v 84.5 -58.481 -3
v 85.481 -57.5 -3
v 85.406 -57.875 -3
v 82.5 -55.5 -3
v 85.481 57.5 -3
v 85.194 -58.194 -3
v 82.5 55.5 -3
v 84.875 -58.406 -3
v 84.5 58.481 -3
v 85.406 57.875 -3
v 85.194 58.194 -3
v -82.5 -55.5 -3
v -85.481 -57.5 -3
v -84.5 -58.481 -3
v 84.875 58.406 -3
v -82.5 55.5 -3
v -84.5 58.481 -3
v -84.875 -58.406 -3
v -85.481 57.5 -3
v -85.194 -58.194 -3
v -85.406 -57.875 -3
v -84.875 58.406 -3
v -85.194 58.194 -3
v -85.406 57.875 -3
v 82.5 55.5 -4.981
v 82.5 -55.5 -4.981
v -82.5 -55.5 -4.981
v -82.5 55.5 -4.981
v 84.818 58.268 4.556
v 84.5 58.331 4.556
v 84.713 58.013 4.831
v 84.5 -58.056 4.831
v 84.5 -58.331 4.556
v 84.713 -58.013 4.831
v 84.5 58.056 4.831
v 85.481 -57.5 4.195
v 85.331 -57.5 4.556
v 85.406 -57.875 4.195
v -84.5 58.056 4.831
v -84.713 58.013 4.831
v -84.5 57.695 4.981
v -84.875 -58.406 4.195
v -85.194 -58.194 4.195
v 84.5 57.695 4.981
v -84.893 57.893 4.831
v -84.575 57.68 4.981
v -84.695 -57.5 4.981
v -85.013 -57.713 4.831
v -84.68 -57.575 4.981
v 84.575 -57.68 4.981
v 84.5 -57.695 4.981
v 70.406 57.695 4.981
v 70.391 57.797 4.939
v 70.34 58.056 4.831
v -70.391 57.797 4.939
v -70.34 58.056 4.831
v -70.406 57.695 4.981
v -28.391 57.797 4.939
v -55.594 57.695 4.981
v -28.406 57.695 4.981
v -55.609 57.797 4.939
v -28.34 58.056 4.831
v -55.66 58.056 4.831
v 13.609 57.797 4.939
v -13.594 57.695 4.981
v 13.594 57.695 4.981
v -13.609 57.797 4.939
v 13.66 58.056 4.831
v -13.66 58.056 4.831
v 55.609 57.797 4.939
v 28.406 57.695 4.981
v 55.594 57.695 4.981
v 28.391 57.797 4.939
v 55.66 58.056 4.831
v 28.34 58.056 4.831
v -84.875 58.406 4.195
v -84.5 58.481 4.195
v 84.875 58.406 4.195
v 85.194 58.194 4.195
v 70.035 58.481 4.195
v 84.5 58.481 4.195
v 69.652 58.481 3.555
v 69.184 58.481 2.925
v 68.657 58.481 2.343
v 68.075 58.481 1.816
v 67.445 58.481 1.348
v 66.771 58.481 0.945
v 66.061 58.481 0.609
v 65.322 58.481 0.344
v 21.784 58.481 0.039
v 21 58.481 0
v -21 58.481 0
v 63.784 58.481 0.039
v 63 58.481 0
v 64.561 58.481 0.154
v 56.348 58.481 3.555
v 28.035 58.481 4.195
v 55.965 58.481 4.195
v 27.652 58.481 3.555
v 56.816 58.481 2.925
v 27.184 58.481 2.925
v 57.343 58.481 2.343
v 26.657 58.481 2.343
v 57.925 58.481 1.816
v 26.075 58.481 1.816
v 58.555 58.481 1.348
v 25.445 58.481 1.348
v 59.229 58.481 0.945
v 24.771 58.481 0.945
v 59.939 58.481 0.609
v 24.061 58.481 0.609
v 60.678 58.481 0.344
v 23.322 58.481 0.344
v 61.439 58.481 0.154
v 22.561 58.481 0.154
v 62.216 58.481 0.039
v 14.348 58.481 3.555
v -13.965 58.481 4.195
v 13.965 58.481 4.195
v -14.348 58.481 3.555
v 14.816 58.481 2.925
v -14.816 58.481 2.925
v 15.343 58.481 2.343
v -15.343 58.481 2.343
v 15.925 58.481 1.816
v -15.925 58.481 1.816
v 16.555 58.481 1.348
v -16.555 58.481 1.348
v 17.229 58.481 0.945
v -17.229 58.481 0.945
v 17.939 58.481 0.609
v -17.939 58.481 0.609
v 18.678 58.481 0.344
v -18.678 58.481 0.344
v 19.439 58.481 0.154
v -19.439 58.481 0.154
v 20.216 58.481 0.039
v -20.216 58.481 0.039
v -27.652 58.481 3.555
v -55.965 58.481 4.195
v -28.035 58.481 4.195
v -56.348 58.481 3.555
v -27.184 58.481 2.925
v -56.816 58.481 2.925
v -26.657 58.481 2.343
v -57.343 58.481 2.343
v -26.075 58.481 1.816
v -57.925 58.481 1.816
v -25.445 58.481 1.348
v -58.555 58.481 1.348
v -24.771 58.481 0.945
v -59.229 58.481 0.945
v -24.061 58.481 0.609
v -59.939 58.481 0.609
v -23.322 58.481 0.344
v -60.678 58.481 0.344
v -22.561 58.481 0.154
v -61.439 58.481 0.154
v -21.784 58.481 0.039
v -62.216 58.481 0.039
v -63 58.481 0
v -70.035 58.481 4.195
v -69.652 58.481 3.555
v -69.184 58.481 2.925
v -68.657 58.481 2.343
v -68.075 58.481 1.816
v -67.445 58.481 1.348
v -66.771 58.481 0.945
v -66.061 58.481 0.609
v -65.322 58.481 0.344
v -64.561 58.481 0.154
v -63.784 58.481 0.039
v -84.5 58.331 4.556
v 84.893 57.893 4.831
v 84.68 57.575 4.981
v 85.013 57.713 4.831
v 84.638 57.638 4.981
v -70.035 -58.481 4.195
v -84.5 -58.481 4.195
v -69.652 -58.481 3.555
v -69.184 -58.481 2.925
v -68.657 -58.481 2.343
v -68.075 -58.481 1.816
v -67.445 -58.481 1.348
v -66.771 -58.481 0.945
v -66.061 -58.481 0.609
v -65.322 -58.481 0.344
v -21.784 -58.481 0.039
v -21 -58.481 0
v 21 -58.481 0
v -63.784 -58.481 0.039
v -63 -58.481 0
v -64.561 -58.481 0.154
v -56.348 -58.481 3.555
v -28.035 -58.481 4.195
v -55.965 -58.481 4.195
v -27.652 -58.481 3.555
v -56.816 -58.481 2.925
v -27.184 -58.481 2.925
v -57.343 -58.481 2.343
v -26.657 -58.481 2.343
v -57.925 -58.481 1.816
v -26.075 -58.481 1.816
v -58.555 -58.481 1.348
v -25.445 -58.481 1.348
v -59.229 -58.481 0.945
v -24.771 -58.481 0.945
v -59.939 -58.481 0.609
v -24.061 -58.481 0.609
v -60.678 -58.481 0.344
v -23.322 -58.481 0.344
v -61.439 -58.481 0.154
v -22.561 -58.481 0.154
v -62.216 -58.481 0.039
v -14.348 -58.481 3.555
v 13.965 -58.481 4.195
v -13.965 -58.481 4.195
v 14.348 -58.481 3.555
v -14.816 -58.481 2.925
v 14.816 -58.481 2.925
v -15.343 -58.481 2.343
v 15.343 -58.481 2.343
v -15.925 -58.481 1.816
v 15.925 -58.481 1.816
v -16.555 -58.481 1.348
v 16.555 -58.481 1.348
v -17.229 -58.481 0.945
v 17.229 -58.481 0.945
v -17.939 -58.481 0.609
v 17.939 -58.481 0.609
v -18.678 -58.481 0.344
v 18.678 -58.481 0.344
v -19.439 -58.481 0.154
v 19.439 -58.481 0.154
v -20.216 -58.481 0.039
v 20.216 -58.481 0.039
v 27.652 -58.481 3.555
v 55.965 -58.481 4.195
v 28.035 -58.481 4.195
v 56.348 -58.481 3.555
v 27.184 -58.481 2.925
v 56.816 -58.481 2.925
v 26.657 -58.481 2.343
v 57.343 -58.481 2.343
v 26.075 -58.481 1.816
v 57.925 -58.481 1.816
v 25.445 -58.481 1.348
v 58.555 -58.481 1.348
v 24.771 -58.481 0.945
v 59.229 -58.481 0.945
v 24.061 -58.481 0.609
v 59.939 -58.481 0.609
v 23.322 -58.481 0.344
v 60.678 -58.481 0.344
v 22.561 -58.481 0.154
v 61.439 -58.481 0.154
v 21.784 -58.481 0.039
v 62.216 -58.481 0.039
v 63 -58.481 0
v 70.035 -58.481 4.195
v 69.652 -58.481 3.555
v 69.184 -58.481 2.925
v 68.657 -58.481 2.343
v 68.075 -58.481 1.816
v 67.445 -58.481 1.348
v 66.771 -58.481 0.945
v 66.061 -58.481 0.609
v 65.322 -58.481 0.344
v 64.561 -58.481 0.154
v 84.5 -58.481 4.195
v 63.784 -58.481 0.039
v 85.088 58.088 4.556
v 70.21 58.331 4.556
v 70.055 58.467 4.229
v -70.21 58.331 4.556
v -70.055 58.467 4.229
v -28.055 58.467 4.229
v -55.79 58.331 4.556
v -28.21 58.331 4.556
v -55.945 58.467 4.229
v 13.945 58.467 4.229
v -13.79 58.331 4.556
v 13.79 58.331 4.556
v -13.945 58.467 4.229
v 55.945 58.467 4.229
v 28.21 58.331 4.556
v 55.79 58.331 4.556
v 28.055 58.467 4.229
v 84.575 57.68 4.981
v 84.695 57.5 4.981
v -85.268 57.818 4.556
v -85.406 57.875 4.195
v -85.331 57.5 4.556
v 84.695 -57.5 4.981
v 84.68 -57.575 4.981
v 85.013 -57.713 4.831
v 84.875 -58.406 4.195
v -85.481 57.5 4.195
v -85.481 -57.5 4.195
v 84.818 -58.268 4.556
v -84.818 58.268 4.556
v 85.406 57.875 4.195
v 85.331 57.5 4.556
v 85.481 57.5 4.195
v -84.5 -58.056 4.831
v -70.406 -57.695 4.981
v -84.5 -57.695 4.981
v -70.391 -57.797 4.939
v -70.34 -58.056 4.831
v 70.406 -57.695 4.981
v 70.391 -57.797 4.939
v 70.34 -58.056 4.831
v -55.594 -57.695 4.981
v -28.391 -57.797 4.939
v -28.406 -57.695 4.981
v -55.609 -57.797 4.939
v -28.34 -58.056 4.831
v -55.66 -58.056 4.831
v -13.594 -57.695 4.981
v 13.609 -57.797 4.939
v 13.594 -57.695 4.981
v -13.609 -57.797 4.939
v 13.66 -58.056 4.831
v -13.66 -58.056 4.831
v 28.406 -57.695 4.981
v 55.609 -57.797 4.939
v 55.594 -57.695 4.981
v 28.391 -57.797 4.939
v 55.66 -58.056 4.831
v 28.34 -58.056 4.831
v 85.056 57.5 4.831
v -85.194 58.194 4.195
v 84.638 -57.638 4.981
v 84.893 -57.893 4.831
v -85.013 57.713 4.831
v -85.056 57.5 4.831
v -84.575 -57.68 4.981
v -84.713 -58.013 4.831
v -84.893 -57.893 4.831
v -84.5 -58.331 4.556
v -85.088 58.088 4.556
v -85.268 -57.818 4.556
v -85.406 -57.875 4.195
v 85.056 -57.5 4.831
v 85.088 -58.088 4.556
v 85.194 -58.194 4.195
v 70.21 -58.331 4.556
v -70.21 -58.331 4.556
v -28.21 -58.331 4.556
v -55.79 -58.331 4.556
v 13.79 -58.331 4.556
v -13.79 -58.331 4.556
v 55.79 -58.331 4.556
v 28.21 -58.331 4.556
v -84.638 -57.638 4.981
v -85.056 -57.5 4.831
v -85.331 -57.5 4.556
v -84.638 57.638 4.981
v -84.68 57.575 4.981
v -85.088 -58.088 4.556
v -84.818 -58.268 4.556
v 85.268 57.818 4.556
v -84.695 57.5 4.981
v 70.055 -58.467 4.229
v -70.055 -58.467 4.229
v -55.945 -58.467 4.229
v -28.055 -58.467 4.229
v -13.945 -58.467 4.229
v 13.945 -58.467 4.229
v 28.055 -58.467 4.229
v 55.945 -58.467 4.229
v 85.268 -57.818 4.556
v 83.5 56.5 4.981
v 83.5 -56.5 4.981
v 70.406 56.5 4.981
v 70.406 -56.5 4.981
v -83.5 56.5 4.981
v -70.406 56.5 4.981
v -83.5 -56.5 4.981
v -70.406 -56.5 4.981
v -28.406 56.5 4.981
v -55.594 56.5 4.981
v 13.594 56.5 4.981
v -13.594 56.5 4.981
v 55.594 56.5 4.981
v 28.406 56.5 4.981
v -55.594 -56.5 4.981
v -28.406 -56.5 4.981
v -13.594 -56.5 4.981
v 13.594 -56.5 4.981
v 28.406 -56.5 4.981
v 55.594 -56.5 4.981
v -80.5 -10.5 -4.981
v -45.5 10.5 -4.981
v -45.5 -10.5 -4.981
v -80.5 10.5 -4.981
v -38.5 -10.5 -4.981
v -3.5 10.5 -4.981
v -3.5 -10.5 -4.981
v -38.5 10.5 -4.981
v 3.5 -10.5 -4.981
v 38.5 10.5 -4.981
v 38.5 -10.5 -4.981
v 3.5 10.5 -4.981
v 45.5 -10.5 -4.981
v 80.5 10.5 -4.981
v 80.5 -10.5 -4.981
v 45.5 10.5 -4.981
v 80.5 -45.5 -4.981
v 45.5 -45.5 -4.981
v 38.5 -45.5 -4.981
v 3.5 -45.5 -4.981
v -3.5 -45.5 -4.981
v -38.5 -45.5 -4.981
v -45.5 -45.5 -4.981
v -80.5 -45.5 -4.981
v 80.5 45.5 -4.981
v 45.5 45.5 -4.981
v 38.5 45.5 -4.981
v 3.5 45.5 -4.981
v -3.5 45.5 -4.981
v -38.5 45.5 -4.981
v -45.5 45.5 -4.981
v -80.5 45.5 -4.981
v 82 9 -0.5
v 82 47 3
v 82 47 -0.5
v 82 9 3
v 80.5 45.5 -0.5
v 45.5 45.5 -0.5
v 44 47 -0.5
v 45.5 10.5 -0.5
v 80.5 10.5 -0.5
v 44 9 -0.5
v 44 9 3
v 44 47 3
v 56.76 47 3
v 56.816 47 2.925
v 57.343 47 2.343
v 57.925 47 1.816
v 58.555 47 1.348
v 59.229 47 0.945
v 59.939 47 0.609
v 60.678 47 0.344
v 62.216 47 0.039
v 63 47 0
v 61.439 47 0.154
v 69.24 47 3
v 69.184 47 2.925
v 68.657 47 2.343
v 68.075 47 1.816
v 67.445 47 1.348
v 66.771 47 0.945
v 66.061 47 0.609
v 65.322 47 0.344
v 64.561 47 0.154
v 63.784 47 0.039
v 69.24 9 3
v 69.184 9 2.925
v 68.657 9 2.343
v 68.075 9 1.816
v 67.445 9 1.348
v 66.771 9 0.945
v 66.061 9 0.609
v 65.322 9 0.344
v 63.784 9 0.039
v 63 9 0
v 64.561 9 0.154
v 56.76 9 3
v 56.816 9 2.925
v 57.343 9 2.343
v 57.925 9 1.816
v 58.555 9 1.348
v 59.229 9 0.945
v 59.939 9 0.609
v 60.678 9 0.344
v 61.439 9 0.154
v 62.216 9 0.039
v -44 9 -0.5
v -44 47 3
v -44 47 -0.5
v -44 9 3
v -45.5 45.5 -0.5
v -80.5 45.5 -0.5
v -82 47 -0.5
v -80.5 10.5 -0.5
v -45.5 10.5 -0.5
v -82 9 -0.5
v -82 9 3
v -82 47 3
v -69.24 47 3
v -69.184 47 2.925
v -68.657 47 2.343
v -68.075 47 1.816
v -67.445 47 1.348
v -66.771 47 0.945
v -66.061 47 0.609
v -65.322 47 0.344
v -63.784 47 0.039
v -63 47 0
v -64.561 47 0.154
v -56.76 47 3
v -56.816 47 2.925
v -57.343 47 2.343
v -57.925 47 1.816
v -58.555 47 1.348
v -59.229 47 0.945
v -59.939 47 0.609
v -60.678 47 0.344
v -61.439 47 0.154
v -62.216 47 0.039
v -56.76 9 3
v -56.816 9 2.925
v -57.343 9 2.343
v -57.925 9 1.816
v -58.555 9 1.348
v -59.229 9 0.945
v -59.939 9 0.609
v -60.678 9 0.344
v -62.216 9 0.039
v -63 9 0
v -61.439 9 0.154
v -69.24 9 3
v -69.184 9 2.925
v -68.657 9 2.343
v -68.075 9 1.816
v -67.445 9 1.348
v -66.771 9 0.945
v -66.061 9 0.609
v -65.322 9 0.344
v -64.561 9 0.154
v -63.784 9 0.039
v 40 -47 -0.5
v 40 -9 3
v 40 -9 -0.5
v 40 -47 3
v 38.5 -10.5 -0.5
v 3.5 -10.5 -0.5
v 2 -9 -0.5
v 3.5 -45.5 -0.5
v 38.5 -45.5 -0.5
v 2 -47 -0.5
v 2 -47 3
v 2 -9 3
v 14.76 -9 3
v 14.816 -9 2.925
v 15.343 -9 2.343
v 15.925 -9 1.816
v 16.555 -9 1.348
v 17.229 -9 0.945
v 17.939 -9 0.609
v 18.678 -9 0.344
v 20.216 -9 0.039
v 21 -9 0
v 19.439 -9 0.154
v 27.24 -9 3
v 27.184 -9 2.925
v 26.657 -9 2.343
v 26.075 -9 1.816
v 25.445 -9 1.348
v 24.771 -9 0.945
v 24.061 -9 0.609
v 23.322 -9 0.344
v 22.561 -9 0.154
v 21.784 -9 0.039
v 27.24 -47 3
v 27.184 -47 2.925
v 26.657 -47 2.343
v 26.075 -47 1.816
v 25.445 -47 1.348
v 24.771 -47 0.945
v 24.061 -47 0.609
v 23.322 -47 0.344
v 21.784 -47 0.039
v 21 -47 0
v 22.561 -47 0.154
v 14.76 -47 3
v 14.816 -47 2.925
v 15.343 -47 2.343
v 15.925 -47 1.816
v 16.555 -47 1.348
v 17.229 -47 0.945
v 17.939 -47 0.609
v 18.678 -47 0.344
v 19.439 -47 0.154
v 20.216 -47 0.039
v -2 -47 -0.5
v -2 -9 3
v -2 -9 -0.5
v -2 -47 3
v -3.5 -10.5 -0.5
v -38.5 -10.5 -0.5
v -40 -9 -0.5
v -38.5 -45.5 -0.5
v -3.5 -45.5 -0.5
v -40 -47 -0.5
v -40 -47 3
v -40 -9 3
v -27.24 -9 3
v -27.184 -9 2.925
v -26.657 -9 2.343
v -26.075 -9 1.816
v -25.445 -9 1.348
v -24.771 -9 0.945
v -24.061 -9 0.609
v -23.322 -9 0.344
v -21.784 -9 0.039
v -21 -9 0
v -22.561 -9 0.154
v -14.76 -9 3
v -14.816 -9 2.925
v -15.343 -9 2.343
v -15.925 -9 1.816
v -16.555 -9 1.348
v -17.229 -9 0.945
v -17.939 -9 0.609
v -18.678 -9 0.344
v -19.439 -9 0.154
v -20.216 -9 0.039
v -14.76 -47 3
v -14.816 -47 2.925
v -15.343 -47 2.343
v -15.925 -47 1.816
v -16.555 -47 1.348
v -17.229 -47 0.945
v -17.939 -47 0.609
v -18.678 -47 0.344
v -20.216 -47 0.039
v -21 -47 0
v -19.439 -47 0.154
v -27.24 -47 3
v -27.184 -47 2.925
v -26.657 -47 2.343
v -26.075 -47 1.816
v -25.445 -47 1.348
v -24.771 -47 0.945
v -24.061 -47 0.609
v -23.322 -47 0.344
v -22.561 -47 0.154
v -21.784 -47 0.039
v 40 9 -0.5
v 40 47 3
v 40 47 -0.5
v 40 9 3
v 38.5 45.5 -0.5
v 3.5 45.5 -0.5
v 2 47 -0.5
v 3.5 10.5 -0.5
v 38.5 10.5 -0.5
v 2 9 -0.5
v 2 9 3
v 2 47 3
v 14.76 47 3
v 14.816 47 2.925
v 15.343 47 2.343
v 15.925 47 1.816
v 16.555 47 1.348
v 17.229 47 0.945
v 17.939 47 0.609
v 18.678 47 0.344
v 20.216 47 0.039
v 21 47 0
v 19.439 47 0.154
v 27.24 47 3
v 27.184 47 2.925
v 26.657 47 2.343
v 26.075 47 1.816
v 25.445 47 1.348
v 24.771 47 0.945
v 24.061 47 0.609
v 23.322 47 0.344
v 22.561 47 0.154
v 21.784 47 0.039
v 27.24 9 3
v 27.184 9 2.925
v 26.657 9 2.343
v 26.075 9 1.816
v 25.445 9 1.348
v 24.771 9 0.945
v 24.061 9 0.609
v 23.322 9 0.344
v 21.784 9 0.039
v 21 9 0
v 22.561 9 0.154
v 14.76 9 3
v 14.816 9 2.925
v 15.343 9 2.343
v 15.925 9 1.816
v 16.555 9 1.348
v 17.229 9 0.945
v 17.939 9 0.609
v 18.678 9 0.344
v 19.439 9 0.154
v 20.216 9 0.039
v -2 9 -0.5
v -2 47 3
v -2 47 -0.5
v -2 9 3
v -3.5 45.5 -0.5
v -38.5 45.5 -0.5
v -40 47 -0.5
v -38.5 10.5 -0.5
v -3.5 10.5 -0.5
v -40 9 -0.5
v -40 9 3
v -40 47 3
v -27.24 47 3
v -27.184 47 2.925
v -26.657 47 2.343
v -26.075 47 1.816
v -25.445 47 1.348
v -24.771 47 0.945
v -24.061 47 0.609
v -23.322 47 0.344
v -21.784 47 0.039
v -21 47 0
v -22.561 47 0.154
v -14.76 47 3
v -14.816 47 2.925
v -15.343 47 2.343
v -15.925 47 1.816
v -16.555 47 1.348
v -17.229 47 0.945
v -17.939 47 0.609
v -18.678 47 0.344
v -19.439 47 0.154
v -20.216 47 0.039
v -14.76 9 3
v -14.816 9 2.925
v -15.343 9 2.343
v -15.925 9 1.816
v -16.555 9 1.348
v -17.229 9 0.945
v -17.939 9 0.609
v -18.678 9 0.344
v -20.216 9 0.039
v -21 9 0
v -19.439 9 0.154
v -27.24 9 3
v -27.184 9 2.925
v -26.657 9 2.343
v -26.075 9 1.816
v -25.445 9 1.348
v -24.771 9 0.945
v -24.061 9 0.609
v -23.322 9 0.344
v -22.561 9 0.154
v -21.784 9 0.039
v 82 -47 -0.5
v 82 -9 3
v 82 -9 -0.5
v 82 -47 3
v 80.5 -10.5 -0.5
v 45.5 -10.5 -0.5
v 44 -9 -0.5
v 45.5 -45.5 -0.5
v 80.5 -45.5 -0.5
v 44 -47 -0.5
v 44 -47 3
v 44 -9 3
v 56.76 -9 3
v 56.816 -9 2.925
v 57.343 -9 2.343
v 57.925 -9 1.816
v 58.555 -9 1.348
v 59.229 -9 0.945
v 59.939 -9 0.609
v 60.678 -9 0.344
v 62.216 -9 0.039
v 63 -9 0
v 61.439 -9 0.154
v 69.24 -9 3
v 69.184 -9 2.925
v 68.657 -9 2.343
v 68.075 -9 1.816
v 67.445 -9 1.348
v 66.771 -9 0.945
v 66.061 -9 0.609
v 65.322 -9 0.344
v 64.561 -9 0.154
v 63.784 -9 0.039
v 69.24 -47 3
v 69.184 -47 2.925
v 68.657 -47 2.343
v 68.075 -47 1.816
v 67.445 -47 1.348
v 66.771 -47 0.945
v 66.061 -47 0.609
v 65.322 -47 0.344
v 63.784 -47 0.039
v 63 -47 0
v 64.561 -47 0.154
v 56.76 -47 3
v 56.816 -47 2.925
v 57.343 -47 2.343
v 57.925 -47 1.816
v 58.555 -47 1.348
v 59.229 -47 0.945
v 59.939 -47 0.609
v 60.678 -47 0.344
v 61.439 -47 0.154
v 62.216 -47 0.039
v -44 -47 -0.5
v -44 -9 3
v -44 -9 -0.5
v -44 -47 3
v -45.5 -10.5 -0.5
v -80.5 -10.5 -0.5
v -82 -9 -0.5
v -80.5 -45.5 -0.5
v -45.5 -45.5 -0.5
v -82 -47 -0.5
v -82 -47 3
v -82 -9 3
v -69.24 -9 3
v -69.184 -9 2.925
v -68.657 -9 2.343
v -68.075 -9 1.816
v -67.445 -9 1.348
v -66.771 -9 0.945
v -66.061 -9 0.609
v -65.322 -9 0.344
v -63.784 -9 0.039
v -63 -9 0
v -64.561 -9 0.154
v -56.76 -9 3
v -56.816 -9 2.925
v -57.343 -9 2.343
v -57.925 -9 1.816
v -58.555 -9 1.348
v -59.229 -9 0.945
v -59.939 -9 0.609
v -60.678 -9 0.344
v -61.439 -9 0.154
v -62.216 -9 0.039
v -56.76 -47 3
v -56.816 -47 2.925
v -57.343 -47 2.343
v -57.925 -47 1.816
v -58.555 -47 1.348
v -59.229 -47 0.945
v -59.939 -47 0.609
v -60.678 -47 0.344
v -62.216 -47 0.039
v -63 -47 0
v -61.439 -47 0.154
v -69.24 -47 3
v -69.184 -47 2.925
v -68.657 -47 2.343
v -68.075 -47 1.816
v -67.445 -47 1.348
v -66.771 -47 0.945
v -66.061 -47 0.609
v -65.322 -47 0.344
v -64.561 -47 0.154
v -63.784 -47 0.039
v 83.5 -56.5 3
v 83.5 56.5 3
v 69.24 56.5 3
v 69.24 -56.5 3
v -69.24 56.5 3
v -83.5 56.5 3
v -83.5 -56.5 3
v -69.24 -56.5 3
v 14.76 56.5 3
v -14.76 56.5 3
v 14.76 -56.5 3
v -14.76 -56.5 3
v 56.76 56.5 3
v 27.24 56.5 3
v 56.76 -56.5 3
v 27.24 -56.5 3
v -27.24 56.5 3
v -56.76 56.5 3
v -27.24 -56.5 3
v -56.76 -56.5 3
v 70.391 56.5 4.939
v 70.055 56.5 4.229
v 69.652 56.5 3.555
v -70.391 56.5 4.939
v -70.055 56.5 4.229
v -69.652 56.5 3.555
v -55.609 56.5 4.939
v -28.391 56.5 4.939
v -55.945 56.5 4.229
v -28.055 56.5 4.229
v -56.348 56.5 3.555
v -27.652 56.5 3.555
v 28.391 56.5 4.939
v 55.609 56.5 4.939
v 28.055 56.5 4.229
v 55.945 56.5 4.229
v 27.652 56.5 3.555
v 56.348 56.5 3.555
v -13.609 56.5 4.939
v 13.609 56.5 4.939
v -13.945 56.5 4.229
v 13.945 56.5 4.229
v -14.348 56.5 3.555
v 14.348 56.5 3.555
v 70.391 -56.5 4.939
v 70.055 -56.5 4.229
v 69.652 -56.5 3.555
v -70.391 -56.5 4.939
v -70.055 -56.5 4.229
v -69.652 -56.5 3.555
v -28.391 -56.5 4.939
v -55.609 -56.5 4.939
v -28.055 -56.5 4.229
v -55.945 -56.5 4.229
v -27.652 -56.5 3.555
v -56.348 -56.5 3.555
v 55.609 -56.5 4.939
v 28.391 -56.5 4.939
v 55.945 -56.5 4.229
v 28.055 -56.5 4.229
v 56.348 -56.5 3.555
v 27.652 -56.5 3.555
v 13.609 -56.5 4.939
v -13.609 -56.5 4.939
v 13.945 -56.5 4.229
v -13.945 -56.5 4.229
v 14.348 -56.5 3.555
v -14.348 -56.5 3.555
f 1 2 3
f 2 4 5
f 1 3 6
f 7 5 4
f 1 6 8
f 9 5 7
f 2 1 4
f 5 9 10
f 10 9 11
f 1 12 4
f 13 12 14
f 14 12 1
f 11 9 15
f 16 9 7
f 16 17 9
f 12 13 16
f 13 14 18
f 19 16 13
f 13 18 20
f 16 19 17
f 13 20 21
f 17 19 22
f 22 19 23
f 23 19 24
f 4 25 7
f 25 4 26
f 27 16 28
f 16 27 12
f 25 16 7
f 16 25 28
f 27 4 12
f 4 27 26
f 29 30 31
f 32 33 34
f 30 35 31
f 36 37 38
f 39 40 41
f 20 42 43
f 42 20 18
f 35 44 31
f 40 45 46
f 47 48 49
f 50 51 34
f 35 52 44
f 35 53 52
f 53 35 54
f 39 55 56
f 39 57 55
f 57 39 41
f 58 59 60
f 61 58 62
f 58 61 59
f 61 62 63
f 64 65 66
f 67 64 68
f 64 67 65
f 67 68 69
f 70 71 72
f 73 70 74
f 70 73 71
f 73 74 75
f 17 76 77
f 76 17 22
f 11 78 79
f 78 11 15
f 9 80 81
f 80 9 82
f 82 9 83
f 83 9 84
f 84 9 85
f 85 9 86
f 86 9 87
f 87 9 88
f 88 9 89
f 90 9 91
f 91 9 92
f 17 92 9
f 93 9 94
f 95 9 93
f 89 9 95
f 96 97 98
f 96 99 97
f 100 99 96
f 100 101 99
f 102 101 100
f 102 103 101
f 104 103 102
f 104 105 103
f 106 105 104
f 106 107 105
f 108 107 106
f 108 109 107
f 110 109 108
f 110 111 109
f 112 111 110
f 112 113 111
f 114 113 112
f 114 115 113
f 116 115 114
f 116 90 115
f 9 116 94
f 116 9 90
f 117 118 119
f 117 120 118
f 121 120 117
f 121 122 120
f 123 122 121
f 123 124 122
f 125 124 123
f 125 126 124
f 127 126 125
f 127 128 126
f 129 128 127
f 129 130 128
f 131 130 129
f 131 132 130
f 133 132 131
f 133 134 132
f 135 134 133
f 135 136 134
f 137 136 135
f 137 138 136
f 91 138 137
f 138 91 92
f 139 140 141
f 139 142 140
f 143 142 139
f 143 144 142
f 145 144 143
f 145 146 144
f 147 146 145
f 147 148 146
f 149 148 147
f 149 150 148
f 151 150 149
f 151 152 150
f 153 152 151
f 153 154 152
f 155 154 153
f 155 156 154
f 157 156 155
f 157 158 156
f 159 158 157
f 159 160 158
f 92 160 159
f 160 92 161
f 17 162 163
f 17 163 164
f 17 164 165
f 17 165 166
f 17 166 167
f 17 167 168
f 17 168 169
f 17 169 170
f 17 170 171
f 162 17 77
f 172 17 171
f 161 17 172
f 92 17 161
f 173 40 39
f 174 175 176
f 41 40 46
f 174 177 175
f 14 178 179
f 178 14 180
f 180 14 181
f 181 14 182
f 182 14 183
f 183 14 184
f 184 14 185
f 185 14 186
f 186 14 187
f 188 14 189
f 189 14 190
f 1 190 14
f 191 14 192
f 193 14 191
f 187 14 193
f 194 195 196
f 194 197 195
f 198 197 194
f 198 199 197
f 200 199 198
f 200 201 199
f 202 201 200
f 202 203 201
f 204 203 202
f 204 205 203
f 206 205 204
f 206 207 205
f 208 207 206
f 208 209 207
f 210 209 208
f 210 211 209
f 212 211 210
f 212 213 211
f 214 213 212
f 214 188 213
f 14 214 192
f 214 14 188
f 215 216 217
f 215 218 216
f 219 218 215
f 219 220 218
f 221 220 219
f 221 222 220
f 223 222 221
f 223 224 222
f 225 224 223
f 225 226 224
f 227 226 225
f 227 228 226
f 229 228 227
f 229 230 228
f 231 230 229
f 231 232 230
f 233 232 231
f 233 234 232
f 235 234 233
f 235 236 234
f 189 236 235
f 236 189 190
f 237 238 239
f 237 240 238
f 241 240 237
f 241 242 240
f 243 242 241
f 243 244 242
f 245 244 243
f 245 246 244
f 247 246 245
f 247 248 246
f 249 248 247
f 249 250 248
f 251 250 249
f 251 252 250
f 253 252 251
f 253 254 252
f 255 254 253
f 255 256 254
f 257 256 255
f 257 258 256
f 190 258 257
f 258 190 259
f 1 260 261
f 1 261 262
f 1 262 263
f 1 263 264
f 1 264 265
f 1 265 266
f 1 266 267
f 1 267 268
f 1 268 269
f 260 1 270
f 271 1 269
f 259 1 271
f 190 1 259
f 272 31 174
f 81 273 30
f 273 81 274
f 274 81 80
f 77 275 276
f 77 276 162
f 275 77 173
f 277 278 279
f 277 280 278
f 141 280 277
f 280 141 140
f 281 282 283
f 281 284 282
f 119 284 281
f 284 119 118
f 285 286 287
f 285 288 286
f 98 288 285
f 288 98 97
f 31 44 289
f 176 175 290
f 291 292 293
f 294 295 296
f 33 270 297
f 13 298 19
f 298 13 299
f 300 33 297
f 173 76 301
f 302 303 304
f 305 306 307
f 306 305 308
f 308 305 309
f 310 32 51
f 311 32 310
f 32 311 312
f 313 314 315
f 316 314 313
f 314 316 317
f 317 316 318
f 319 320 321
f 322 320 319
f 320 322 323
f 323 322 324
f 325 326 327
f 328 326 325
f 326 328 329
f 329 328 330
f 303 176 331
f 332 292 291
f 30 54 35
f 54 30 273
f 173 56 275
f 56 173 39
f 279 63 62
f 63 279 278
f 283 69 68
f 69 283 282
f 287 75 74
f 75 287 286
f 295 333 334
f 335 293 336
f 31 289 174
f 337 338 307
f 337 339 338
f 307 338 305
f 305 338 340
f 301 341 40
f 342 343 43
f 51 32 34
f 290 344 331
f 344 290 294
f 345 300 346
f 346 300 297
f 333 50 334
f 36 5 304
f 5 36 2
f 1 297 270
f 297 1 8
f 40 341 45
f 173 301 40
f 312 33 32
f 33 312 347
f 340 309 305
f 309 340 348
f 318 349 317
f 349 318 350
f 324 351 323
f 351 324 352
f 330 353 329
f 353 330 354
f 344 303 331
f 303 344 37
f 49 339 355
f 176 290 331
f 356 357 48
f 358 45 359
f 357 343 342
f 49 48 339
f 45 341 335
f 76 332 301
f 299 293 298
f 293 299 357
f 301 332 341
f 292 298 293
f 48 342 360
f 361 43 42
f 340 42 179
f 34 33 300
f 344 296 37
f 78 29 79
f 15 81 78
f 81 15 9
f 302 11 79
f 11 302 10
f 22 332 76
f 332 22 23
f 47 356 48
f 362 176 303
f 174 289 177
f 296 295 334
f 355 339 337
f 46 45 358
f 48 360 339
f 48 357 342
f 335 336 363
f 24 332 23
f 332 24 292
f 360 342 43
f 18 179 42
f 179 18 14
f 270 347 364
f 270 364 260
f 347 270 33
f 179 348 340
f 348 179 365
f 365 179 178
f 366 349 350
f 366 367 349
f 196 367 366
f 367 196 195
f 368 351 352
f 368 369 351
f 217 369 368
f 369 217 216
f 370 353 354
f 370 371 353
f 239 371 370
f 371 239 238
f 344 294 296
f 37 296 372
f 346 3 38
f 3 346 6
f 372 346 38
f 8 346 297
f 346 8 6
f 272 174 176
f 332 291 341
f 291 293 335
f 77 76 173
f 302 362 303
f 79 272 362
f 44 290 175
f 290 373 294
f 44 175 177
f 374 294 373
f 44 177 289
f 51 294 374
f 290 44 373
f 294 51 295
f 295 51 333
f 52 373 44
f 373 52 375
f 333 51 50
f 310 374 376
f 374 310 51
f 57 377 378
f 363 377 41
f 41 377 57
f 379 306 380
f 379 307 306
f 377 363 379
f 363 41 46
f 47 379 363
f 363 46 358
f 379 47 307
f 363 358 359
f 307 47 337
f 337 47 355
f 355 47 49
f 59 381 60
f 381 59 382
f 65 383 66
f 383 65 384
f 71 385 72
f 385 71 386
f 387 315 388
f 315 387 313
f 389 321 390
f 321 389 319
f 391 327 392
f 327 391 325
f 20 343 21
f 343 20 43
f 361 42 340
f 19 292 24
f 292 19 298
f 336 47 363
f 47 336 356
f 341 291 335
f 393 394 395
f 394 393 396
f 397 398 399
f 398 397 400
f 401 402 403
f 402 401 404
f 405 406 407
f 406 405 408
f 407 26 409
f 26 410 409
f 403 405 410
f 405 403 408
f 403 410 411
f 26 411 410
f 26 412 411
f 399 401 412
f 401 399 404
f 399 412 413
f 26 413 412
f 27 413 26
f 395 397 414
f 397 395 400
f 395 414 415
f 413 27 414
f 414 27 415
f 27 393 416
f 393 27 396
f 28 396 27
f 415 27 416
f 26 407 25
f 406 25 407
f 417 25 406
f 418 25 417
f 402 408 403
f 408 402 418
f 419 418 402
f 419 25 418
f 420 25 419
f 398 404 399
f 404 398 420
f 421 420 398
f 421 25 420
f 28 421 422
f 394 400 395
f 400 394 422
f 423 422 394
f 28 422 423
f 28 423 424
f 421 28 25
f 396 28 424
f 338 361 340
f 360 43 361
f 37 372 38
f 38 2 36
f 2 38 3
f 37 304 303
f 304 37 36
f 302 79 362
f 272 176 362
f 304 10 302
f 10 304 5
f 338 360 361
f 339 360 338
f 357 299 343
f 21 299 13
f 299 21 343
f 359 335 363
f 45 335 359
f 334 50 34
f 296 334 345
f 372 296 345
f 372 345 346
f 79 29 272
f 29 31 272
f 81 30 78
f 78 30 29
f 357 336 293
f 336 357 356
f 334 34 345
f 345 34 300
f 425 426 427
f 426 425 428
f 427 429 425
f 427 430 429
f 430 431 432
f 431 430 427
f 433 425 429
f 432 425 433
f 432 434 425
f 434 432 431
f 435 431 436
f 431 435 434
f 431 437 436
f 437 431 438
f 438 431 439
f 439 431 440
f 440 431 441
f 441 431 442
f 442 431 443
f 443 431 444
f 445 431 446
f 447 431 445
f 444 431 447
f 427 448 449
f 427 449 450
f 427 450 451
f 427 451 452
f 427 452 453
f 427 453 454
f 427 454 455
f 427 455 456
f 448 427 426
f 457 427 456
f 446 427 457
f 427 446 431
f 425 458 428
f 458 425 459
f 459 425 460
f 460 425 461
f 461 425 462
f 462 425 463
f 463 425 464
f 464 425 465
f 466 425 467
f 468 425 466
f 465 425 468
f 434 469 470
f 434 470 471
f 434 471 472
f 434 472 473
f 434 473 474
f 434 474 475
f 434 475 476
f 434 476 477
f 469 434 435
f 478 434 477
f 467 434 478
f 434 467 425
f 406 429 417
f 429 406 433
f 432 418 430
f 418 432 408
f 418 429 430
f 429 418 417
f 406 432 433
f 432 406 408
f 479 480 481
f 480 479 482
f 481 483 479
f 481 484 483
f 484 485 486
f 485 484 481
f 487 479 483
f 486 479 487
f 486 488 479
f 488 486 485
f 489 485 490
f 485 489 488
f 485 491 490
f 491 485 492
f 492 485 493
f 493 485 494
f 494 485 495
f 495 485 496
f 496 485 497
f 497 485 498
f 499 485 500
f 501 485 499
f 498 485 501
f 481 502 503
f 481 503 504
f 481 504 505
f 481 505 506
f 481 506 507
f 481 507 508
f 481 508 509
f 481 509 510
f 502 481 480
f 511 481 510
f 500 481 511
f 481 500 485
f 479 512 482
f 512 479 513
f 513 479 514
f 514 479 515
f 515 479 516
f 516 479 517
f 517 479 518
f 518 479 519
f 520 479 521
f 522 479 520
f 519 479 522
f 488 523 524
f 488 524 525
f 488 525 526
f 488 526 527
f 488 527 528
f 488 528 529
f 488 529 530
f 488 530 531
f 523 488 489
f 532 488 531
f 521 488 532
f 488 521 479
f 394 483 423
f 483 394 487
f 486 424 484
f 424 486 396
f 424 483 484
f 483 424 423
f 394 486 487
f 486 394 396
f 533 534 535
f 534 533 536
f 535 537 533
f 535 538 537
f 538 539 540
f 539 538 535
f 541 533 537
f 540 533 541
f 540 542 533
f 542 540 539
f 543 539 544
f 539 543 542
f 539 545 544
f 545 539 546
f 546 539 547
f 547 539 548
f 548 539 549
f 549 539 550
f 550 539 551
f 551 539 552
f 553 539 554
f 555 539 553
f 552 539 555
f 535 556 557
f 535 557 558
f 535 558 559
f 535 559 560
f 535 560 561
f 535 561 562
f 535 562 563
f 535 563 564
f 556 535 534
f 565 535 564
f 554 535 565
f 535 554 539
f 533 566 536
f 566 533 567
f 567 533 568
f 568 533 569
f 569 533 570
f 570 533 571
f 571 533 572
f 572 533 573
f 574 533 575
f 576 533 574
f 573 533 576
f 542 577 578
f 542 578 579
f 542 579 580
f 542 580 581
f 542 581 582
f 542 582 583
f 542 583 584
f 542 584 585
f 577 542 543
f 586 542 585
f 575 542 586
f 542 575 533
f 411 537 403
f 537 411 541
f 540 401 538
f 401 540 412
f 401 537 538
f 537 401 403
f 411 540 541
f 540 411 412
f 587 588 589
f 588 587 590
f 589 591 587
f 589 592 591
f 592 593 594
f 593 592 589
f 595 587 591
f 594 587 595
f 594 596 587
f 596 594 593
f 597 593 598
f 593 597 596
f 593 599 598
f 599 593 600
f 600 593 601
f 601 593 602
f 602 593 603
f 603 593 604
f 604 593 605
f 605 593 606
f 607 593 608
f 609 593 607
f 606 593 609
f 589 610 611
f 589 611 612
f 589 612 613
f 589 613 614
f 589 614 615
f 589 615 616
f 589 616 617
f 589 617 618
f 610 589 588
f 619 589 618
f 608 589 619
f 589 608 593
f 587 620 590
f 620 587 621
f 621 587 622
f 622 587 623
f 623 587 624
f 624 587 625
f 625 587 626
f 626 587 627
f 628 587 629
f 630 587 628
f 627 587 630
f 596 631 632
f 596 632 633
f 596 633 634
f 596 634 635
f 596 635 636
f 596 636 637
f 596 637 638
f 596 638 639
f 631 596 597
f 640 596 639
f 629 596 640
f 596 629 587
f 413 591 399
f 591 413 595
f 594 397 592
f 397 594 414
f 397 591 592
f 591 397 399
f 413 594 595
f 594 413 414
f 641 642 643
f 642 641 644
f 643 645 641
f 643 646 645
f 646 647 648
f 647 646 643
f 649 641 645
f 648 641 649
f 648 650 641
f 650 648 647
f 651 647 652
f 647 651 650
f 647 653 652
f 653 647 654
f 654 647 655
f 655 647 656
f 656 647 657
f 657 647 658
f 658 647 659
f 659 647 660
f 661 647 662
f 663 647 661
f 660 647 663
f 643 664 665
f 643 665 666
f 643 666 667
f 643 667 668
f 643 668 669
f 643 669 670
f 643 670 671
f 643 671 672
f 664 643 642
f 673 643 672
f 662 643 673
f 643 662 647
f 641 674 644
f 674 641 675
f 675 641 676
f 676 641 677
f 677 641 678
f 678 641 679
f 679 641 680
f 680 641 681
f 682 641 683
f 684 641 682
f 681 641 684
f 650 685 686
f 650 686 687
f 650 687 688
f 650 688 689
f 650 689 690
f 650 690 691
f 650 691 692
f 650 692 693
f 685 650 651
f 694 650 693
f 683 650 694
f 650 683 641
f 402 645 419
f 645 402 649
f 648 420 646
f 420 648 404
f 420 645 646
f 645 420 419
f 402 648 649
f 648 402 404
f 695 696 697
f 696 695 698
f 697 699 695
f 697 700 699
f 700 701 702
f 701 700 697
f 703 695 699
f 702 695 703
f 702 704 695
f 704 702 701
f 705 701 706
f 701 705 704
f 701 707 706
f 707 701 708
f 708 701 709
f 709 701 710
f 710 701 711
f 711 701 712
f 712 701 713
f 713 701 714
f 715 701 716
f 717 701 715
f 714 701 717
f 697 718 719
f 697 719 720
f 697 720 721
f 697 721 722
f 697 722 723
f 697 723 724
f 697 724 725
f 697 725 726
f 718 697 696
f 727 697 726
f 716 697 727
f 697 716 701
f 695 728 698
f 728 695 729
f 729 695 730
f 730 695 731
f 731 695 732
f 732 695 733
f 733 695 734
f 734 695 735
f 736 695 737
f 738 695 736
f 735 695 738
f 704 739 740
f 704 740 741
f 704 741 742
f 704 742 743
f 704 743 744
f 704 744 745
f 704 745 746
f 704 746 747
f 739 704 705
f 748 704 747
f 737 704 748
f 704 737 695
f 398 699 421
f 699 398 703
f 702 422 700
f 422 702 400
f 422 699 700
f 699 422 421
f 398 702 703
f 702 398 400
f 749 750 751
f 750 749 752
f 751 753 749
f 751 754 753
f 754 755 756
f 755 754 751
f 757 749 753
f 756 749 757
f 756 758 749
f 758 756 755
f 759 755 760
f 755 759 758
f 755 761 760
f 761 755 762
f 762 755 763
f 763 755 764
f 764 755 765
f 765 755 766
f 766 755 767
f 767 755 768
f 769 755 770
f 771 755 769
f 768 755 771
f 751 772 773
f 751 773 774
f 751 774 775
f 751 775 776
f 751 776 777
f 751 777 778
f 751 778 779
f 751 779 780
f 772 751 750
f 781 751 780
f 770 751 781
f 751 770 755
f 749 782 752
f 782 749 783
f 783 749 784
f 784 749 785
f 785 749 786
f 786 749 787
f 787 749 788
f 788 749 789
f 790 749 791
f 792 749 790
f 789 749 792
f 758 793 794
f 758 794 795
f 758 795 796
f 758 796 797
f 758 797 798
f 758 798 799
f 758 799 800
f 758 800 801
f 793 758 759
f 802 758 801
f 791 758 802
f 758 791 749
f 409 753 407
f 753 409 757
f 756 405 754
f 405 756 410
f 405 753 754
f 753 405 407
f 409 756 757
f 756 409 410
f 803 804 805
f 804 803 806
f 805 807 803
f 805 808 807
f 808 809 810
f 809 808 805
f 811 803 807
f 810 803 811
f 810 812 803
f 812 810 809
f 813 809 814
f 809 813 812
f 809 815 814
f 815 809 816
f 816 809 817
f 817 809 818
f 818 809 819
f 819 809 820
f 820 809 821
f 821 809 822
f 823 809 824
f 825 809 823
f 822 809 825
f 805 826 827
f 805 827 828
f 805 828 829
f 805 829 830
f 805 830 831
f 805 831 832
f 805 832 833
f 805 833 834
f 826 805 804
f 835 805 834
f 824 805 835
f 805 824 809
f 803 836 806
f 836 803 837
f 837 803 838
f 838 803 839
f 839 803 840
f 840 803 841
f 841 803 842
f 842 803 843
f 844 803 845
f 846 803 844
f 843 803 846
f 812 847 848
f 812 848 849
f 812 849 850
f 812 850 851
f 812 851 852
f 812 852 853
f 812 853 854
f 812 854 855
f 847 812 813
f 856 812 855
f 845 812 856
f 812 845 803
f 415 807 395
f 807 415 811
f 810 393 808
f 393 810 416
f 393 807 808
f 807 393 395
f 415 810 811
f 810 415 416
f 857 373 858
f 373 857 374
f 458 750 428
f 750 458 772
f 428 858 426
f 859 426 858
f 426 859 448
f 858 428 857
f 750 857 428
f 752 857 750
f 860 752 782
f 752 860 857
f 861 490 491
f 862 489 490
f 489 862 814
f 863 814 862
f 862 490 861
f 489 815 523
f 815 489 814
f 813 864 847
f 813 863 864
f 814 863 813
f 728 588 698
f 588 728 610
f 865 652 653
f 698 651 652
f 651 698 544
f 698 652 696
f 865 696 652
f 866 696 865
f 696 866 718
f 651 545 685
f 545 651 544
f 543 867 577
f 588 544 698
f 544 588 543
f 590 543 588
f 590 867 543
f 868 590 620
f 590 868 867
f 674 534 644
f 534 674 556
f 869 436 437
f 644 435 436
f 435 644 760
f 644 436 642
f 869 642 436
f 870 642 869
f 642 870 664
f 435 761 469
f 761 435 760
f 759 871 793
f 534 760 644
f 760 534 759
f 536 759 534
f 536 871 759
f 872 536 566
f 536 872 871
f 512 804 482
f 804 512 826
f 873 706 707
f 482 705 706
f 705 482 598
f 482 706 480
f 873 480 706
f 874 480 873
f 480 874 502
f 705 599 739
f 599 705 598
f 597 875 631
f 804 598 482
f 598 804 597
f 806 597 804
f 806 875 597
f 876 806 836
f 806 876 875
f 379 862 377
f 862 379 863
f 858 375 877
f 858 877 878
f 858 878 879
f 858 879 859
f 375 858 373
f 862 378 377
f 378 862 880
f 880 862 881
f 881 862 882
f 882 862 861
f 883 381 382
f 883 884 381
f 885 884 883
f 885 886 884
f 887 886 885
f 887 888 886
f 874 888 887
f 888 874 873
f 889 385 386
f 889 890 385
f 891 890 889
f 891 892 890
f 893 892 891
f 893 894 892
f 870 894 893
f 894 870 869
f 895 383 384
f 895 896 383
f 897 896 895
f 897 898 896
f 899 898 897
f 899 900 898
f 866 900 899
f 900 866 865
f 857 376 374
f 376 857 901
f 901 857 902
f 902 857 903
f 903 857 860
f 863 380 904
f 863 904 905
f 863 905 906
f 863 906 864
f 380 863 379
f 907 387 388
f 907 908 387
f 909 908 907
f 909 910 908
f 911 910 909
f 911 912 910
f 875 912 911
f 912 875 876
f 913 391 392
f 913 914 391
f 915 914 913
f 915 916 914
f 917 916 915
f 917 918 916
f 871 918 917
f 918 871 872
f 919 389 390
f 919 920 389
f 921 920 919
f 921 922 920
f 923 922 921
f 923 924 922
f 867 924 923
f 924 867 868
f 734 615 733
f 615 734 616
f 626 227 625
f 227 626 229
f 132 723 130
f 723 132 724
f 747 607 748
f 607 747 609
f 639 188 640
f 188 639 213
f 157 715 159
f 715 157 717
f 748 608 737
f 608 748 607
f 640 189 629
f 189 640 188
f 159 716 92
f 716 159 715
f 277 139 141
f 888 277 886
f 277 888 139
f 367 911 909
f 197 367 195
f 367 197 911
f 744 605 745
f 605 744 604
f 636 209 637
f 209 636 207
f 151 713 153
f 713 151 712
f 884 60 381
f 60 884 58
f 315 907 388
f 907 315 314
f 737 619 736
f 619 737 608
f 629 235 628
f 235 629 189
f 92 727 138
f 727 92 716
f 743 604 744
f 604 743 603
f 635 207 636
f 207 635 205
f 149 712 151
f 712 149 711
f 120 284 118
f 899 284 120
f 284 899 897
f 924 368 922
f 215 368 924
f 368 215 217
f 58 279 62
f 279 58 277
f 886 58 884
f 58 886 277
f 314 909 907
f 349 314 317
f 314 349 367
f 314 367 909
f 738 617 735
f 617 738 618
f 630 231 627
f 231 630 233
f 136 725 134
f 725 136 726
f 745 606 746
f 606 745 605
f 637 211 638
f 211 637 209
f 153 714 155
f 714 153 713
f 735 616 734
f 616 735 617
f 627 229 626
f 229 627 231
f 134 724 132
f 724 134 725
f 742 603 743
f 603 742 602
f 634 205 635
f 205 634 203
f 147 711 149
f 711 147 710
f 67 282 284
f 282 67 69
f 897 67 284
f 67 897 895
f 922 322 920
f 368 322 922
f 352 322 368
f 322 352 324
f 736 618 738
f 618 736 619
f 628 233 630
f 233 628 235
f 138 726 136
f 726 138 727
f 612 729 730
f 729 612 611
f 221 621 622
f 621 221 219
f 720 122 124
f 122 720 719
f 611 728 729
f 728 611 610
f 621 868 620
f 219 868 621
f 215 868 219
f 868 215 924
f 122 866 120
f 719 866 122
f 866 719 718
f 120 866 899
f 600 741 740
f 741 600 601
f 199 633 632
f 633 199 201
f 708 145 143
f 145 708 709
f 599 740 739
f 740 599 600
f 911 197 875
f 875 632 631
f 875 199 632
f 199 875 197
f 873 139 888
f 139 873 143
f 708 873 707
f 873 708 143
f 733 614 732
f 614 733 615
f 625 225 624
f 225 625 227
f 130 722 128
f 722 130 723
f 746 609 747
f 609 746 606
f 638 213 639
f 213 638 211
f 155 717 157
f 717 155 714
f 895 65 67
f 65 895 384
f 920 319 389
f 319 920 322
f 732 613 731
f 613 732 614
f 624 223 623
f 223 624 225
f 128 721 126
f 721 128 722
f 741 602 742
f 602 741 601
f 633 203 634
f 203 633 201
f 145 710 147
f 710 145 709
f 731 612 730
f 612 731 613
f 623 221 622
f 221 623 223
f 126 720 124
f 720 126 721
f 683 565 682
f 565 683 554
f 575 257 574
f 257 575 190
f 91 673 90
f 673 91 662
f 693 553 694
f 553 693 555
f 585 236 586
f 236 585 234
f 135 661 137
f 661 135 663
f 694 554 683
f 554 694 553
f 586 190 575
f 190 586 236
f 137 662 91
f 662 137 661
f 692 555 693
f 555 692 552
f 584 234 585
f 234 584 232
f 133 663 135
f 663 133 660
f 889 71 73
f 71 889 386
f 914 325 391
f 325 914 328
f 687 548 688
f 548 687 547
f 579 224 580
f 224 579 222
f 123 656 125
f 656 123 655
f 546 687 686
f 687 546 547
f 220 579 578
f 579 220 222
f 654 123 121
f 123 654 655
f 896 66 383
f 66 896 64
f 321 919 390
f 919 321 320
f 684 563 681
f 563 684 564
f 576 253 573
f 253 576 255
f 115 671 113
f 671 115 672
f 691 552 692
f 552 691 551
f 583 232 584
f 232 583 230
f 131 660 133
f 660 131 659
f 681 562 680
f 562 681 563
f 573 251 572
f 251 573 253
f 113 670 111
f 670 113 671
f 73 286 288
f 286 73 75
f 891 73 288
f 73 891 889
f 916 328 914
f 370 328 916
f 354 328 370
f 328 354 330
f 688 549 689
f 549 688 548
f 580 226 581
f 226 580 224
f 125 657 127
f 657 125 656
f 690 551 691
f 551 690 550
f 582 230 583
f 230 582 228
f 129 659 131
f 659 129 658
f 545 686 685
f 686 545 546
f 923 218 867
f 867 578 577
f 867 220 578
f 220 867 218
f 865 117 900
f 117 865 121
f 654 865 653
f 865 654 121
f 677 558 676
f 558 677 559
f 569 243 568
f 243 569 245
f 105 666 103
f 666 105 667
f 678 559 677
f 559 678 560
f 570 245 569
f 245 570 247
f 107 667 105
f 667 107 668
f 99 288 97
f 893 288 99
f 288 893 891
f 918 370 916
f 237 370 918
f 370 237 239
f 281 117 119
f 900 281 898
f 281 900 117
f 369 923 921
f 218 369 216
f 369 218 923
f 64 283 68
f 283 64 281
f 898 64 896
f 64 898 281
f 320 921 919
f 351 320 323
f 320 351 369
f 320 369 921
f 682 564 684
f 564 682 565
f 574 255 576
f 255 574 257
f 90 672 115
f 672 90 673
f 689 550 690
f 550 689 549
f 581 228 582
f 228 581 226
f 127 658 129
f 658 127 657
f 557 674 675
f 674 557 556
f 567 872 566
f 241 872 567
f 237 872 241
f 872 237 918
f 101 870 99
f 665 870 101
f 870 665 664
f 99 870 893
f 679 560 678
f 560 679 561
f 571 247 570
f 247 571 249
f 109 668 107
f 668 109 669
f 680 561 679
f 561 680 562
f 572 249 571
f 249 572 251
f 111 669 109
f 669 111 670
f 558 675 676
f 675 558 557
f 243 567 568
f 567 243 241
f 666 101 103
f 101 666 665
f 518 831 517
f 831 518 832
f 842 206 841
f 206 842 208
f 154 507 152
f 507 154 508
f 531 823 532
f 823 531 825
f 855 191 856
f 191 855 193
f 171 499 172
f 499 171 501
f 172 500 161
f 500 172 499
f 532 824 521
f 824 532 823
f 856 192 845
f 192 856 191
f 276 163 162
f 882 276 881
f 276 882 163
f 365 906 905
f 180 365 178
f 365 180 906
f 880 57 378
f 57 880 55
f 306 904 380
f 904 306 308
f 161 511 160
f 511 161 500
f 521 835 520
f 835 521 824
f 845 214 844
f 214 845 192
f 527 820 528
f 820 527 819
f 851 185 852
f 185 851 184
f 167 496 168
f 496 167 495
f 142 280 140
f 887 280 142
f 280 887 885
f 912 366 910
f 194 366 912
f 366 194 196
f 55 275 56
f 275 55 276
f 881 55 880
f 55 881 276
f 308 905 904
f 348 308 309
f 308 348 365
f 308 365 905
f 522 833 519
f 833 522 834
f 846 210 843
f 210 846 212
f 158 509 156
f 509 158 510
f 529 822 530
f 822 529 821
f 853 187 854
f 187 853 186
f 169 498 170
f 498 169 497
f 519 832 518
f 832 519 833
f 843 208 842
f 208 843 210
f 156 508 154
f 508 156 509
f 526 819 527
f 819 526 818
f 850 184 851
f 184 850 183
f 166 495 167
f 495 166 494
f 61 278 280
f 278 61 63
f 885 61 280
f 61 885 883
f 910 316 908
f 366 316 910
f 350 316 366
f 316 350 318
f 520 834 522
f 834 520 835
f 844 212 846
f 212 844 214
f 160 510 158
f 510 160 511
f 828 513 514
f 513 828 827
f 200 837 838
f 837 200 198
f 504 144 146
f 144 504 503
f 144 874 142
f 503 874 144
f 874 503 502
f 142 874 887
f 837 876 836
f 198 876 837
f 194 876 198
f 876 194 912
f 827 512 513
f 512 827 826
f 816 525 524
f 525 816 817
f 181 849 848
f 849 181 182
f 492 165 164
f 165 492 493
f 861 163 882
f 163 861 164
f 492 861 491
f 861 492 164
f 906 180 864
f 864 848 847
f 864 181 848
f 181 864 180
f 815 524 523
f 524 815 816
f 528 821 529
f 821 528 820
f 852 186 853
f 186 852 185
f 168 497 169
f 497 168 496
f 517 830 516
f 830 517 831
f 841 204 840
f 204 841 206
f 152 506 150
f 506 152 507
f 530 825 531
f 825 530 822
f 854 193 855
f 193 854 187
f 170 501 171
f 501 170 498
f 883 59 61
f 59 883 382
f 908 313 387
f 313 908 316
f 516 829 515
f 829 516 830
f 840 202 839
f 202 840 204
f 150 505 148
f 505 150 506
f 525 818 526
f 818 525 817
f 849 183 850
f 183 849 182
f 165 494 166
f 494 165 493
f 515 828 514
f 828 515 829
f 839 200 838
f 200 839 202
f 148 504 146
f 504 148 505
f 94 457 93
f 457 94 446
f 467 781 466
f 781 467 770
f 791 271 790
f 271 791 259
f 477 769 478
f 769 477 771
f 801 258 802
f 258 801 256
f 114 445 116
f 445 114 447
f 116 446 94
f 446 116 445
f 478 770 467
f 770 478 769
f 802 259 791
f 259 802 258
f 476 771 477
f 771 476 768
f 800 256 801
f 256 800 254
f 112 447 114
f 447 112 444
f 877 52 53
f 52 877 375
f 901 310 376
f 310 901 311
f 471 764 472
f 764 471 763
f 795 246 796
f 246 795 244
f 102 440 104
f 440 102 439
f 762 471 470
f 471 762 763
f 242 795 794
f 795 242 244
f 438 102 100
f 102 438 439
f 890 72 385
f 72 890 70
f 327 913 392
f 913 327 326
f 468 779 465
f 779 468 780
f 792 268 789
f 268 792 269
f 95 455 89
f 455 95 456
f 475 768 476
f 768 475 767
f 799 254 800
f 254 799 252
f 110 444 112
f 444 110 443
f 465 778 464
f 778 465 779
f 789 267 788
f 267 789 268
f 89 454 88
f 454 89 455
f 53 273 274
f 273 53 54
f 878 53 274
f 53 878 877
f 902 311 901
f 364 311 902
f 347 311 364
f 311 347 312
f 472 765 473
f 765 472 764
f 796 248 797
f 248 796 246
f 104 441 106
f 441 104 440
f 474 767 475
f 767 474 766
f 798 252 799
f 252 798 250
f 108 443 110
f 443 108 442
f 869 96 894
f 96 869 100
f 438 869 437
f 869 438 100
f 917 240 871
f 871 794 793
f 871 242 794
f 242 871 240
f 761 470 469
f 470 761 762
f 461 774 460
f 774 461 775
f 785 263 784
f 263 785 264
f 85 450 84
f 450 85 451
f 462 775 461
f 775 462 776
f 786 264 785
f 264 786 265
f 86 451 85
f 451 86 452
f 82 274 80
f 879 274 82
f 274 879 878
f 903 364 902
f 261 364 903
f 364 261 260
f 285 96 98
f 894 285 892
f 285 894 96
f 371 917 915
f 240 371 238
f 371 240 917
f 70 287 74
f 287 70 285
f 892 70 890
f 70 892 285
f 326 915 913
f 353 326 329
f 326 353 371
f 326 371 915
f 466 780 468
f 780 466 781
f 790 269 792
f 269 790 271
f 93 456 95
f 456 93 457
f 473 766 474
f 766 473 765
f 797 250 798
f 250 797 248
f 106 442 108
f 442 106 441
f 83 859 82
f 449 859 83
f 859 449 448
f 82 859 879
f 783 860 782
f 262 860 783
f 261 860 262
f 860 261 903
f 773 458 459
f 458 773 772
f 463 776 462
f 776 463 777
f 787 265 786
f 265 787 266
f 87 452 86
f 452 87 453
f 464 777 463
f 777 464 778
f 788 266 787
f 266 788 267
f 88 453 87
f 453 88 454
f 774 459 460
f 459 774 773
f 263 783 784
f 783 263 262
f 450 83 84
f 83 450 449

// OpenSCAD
// Base
module base_ppal() {
    // Partes a sumar
    difference(){
        minkowski(){
            sphere(1, $fn=16);
            cube ([169, 115, 8], center = true);
        }
        
    // Partes a restar (Hueco parte inferior, para calzar en otro tray)   
    difference() { 
        translate([0,0, -7 ]) cube ([200, 150, 8], center = true);
        translate([0,0, -7 ]) cube ([165, 111, 8], center = true);
        
    }
    }
}


// Cuerpo del micro---------------------------------------------------
module micro() {
    // Cuerpo del micro
    translate([0,0, 7 ]) cube ([38, 38, 10], center = true);
    // Pines del micro
    translate([0,0,-1 ]) cube ([35, 35,  7], center = true);
}


//Tray
module tray() {
    difference() {
        union() {
            base_ppal();

        }
        // Partes a restar 
        union(){
            translate([ 63, 28,-2.5 ]) micro();
            translate([-63, 28,-2.5 ]) micro();     
            
            translate([ 21 ,-28,-2.5 ]) micro();
            translate([-21 ,-28,-2.5 ]) micro(); 
            
            translate([ 21 , 28,-2.5 ]) micro();
            translate([-21 , 28,-2.5 ]) micro();             
     
            translate([ 63,-28,-2.5 ]) micro();
            translate([-63,-28,-2.5 ]) micro();  
            
            // Hueco parte superior, para calzar en otro tray   
            translate([0,0, 7 ]) cube ([167, 113, 8], center = true);

            // Huecos para los dedos, para poder retirar los micros mas facil
            rotate ([ 0, 90, 90]) translate ([-8, 21,0]) cylinder(200, 8,8, $fn=64, center=true);
            rotate ([ 0, 90, 90]) translate ([-8,-21,0]) cylinder(200, 8,8, $fn=64, center=true);  
            rotate ([ 0, 90, 90]) translate ([-8, 63,0]) cylinder(200, 8,8, $fn=64, center=true);
            rotate ([ 0, 90, 90]) translate ([-8,-63,0]) cylinder(200, 8,8, $fn=64, center=true);   
            
        }
    }
}


 tray();
